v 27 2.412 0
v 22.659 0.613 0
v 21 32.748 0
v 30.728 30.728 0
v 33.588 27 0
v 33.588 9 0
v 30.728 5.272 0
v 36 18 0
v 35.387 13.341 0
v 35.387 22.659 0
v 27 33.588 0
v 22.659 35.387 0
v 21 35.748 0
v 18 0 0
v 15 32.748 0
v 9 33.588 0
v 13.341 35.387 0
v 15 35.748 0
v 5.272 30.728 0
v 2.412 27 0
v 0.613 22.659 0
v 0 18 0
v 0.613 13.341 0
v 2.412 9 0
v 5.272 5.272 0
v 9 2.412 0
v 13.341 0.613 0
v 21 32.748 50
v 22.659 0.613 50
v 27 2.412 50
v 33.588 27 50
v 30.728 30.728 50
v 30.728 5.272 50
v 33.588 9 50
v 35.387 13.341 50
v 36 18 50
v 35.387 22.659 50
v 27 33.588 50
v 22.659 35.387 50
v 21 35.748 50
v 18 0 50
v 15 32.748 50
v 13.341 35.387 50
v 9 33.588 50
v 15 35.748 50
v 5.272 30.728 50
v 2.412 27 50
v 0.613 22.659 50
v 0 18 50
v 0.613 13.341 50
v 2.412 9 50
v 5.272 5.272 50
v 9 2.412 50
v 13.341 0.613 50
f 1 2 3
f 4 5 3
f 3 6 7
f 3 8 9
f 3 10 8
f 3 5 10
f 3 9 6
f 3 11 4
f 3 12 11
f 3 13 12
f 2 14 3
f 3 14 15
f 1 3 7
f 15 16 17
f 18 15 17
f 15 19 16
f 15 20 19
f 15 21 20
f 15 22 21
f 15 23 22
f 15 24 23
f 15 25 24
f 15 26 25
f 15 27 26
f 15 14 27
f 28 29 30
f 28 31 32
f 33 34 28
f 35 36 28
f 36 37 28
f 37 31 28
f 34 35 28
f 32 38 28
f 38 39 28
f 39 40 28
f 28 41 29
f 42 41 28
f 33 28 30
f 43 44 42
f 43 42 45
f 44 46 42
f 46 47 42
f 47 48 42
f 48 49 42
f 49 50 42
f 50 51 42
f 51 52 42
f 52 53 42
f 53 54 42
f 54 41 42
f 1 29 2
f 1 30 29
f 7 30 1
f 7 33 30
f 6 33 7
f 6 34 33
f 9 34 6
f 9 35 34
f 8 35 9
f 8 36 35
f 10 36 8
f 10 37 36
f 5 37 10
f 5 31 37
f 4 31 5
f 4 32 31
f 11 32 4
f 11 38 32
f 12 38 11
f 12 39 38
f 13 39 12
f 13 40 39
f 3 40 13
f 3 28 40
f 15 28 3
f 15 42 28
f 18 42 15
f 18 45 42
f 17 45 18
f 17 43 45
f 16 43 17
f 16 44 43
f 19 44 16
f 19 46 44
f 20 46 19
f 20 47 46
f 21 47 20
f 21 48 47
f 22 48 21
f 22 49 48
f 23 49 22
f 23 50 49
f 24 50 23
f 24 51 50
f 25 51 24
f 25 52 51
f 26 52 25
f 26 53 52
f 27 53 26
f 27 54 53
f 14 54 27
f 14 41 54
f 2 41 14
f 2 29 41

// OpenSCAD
$fn = 32;

// ----------------------------------------------------------------------
// Keyway shaft: d36 shaft, key 6 x 3 mm
// ----------------------------------------------------------------------

// --- parameters (mm) ---
shaft_r = 18;             // shaft radius
key_w = 6;                // keyway width
key_d = 3;                // keyway depth below the surface line
plate_t = 50;             // shaft length, Z (extrusion height)

shaft_d = 2 * shaft_r;  // shaft diameter
circle_step = 15;  // polygon sampling step, degrees

profile = [[13.341, 35.387], [9, 33.588], [5.272, 30.728], [2.412, 27], [0.613, 22.659], [0, 18], [0.613, 13.341], [2.412, 9], [5.272, 5.272], [9, 2.412], [13.341, 0.613], [18, 0], [22.659, 0.613], [27, 2.412], [30.728, 5.272], [33.588, 9], [35.387, 13.341], [36, 18], [35.387, 22.659], [33.588, 27], [30.728, 30.728], [27, 33.588], [22.659, 35.387], [21, 35.748], [21, 32.748], [15, 32.748], [15, 35.748]];  // primary outline, 27 points, counter clockwise

// --- the one profile operation ---
linear_extrude(height = plate_t) polygon(points = profile);
